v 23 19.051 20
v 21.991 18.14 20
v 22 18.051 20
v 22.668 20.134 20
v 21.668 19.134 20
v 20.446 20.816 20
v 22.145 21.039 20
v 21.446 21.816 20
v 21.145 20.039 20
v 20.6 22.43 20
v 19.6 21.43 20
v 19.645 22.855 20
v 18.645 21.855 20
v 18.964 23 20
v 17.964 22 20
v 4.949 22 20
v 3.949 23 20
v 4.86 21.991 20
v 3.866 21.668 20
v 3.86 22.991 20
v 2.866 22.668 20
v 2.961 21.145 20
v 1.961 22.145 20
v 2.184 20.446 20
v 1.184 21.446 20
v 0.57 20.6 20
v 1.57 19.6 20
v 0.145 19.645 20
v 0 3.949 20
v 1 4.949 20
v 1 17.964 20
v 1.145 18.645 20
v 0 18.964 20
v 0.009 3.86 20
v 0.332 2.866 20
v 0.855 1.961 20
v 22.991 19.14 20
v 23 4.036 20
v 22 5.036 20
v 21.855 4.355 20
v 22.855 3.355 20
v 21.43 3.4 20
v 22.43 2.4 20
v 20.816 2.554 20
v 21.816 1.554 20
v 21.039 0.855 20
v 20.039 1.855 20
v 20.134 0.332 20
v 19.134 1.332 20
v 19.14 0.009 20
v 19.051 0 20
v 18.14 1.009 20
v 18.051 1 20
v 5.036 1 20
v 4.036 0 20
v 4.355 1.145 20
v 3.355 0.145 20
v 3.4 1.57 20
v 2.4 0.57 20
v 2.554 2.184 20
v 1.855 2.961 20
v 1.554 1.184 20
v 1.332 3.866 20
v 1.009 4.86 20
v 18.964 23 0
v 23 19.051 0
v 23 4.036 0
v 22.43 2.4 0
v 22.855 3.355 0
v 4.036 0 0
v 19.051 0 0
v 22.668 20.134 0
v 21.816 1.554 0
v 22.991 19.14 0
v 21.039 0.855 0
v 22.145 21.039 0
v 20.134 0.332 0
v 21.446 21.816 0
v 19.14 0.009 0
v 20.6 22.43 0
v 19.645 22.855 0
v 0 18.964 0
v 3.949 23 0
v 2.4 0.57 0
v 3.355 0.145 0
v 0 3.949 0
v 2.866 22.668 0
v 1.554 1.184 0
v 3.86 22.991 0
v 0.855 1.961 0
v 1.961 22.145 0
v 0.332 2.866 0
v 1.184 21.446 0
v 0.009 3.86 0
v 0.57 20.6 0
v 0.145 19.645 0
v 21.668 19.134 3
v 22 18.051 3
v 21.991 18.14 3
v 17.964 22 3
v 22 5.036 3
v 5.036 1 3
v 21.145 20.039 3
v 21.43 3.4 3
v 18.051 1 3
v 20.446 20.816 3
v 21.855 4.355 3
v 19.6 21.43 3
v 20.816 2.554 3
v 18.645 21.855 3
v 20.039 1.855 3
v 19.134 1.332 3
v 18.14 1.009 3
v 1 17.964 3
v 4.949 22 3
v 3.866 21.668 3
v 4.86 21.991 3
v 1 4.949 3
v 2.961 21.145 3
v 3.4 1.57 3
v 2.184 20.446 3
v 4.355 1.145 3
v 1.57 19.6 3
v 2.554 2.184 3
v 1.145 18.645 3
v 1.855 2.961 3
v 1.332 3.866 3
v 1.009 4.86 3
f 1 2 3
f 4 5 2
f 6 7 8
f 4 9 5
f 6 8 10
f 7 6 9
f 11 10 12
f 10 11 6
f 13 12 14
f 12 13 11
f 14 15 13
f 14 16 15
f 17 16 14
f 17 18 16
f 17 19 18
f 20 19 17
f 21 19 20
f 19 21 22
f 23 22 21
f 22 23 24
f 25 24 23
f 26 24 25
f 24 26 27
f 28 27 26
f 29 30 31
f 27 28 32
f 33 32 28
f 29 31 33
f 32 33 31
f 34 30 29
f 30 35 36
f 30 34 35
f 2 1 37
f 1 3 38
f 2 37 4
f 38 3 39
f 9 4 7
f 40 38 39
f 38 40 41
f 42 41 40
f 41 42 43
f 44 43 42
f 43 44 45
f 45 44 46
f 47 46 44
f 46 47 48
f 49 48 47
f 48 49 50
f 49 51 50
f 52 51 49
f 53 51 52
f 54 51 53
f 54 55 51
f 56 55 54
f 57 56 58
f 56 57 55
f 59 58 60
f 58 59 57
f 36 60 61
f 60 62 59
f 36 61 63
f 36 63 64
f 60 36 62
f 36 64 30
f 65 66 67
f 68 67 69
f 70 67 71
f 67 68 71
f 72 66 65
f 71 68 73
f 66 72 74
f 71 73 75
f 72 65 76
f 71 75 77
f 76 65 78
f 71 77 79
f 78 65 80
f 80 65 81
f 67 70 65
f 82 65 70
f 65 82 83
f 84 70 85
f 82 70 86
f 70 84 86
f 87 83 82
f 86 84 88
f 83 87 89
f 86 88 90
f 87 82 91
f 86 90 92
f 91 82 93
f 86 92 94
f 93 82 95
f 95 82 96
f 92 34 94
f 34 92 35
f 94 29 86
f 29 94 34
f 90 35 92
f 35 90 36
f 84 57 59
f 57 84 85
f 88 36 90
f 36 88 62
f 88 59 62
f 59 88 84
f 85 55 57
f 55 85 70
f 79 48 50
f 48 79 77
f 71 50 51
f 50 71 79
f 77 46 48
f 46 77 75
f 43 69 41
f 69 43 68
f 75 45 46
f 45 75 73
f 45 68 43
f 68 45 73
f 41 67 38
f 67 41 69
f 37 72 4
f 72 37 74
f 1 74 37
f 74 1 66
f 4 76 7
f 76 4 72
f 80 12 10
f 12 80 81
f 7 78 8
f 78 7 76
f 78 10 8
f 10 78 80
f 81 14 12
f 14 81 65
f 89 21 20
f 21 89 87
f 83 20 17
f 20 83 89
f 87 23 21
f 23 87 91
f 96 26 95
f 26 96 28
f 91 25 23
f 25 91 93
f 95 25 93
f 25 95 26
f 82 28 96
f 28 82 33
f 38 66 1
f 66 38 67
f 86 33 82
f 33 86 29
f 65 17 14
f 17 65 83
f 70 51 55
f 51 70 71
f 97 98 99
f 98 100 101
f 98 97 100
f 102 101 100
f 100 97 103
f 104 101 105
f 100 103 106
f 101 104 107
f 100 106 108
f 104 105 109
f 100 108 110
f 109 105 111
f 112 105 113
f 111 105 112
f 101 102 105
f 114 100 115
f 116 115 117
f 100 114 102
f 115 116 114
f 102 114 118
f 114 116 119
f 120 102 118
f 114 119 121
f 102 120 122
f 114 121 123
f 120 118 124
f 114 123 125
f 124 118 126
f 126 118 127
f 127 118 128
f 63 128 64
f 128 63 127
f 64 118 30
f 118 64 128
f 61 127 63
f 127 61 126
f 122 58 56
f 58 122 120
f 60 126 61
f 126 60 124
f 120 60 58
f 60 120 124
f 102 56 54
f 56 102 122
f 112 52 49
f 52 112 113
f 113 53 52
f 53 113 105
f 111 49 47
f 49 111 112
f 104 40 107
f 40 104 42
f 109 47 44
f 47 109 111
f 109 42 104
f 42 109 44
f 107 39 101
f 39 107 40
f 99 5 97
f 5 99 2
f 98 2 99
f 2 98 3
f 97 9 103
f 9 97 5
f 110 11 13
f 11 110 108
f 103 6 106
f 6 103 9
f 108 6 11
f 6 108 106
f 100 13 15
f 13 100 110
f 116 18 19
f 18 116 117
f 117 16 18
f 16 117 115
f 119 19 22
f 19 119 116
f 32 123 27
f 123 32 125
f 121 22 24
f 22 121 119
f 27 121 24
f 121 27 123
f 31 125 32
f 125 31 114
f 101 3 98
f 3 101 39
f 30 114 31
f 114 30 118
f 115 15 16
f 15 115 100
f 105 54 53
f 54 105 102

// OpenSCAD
// file: ../libs/rounded_corners.scad
// Round Corners
// author: Bradley Jones

$fn=30;

// Makes the cut out required to diff with the cube
module cut_out(radius, height) {
	translate([-radius/2,-radius/2,height/2]) 
	difference() {
		translate([radius/4,radius/4,0]) cube([radius/2, radius/2, height], center=true);
		cylinder(height, d=radius, center=true);
	}
}

// corners=[(0,0),(1,0),(0,1),(1,1)]
module rounded_cube(width, length, height, radius, corners=[true,true,true,true]) {
	difference() {
		cube([width, length, height]);
		// Starting with corner at 0,0 then working anti-clockwise
		if (corners[0]==true) 
			translate([-0.1,-0.1,0]) rotate([0,0,180]) cut_out(radius, height);
		if (corners[1]==true) 
			translate([width + 0.1,-0.1,0]) rotate([0,0,270]) cut_out(radius, height);
		if (corners[2]==true) 
			translate([width + 0.1,length+0.1,0]) rotate([0,0,0]) cut_out(radius, height);
		if (corners[3]==true) 
			translate([-0.1,length + 0.1,0]) rotate([0,0,90]) cut_out(radius, height);

	}
}
// main file
$fn = 50;

use <../libs/rounded_corners.scad>;

base_height=3;

difference() {
  rounded_cube(23, 23, 20, 10);
  translate([1,1,base_height]) rounded_cube(21,21,20,10);
}
